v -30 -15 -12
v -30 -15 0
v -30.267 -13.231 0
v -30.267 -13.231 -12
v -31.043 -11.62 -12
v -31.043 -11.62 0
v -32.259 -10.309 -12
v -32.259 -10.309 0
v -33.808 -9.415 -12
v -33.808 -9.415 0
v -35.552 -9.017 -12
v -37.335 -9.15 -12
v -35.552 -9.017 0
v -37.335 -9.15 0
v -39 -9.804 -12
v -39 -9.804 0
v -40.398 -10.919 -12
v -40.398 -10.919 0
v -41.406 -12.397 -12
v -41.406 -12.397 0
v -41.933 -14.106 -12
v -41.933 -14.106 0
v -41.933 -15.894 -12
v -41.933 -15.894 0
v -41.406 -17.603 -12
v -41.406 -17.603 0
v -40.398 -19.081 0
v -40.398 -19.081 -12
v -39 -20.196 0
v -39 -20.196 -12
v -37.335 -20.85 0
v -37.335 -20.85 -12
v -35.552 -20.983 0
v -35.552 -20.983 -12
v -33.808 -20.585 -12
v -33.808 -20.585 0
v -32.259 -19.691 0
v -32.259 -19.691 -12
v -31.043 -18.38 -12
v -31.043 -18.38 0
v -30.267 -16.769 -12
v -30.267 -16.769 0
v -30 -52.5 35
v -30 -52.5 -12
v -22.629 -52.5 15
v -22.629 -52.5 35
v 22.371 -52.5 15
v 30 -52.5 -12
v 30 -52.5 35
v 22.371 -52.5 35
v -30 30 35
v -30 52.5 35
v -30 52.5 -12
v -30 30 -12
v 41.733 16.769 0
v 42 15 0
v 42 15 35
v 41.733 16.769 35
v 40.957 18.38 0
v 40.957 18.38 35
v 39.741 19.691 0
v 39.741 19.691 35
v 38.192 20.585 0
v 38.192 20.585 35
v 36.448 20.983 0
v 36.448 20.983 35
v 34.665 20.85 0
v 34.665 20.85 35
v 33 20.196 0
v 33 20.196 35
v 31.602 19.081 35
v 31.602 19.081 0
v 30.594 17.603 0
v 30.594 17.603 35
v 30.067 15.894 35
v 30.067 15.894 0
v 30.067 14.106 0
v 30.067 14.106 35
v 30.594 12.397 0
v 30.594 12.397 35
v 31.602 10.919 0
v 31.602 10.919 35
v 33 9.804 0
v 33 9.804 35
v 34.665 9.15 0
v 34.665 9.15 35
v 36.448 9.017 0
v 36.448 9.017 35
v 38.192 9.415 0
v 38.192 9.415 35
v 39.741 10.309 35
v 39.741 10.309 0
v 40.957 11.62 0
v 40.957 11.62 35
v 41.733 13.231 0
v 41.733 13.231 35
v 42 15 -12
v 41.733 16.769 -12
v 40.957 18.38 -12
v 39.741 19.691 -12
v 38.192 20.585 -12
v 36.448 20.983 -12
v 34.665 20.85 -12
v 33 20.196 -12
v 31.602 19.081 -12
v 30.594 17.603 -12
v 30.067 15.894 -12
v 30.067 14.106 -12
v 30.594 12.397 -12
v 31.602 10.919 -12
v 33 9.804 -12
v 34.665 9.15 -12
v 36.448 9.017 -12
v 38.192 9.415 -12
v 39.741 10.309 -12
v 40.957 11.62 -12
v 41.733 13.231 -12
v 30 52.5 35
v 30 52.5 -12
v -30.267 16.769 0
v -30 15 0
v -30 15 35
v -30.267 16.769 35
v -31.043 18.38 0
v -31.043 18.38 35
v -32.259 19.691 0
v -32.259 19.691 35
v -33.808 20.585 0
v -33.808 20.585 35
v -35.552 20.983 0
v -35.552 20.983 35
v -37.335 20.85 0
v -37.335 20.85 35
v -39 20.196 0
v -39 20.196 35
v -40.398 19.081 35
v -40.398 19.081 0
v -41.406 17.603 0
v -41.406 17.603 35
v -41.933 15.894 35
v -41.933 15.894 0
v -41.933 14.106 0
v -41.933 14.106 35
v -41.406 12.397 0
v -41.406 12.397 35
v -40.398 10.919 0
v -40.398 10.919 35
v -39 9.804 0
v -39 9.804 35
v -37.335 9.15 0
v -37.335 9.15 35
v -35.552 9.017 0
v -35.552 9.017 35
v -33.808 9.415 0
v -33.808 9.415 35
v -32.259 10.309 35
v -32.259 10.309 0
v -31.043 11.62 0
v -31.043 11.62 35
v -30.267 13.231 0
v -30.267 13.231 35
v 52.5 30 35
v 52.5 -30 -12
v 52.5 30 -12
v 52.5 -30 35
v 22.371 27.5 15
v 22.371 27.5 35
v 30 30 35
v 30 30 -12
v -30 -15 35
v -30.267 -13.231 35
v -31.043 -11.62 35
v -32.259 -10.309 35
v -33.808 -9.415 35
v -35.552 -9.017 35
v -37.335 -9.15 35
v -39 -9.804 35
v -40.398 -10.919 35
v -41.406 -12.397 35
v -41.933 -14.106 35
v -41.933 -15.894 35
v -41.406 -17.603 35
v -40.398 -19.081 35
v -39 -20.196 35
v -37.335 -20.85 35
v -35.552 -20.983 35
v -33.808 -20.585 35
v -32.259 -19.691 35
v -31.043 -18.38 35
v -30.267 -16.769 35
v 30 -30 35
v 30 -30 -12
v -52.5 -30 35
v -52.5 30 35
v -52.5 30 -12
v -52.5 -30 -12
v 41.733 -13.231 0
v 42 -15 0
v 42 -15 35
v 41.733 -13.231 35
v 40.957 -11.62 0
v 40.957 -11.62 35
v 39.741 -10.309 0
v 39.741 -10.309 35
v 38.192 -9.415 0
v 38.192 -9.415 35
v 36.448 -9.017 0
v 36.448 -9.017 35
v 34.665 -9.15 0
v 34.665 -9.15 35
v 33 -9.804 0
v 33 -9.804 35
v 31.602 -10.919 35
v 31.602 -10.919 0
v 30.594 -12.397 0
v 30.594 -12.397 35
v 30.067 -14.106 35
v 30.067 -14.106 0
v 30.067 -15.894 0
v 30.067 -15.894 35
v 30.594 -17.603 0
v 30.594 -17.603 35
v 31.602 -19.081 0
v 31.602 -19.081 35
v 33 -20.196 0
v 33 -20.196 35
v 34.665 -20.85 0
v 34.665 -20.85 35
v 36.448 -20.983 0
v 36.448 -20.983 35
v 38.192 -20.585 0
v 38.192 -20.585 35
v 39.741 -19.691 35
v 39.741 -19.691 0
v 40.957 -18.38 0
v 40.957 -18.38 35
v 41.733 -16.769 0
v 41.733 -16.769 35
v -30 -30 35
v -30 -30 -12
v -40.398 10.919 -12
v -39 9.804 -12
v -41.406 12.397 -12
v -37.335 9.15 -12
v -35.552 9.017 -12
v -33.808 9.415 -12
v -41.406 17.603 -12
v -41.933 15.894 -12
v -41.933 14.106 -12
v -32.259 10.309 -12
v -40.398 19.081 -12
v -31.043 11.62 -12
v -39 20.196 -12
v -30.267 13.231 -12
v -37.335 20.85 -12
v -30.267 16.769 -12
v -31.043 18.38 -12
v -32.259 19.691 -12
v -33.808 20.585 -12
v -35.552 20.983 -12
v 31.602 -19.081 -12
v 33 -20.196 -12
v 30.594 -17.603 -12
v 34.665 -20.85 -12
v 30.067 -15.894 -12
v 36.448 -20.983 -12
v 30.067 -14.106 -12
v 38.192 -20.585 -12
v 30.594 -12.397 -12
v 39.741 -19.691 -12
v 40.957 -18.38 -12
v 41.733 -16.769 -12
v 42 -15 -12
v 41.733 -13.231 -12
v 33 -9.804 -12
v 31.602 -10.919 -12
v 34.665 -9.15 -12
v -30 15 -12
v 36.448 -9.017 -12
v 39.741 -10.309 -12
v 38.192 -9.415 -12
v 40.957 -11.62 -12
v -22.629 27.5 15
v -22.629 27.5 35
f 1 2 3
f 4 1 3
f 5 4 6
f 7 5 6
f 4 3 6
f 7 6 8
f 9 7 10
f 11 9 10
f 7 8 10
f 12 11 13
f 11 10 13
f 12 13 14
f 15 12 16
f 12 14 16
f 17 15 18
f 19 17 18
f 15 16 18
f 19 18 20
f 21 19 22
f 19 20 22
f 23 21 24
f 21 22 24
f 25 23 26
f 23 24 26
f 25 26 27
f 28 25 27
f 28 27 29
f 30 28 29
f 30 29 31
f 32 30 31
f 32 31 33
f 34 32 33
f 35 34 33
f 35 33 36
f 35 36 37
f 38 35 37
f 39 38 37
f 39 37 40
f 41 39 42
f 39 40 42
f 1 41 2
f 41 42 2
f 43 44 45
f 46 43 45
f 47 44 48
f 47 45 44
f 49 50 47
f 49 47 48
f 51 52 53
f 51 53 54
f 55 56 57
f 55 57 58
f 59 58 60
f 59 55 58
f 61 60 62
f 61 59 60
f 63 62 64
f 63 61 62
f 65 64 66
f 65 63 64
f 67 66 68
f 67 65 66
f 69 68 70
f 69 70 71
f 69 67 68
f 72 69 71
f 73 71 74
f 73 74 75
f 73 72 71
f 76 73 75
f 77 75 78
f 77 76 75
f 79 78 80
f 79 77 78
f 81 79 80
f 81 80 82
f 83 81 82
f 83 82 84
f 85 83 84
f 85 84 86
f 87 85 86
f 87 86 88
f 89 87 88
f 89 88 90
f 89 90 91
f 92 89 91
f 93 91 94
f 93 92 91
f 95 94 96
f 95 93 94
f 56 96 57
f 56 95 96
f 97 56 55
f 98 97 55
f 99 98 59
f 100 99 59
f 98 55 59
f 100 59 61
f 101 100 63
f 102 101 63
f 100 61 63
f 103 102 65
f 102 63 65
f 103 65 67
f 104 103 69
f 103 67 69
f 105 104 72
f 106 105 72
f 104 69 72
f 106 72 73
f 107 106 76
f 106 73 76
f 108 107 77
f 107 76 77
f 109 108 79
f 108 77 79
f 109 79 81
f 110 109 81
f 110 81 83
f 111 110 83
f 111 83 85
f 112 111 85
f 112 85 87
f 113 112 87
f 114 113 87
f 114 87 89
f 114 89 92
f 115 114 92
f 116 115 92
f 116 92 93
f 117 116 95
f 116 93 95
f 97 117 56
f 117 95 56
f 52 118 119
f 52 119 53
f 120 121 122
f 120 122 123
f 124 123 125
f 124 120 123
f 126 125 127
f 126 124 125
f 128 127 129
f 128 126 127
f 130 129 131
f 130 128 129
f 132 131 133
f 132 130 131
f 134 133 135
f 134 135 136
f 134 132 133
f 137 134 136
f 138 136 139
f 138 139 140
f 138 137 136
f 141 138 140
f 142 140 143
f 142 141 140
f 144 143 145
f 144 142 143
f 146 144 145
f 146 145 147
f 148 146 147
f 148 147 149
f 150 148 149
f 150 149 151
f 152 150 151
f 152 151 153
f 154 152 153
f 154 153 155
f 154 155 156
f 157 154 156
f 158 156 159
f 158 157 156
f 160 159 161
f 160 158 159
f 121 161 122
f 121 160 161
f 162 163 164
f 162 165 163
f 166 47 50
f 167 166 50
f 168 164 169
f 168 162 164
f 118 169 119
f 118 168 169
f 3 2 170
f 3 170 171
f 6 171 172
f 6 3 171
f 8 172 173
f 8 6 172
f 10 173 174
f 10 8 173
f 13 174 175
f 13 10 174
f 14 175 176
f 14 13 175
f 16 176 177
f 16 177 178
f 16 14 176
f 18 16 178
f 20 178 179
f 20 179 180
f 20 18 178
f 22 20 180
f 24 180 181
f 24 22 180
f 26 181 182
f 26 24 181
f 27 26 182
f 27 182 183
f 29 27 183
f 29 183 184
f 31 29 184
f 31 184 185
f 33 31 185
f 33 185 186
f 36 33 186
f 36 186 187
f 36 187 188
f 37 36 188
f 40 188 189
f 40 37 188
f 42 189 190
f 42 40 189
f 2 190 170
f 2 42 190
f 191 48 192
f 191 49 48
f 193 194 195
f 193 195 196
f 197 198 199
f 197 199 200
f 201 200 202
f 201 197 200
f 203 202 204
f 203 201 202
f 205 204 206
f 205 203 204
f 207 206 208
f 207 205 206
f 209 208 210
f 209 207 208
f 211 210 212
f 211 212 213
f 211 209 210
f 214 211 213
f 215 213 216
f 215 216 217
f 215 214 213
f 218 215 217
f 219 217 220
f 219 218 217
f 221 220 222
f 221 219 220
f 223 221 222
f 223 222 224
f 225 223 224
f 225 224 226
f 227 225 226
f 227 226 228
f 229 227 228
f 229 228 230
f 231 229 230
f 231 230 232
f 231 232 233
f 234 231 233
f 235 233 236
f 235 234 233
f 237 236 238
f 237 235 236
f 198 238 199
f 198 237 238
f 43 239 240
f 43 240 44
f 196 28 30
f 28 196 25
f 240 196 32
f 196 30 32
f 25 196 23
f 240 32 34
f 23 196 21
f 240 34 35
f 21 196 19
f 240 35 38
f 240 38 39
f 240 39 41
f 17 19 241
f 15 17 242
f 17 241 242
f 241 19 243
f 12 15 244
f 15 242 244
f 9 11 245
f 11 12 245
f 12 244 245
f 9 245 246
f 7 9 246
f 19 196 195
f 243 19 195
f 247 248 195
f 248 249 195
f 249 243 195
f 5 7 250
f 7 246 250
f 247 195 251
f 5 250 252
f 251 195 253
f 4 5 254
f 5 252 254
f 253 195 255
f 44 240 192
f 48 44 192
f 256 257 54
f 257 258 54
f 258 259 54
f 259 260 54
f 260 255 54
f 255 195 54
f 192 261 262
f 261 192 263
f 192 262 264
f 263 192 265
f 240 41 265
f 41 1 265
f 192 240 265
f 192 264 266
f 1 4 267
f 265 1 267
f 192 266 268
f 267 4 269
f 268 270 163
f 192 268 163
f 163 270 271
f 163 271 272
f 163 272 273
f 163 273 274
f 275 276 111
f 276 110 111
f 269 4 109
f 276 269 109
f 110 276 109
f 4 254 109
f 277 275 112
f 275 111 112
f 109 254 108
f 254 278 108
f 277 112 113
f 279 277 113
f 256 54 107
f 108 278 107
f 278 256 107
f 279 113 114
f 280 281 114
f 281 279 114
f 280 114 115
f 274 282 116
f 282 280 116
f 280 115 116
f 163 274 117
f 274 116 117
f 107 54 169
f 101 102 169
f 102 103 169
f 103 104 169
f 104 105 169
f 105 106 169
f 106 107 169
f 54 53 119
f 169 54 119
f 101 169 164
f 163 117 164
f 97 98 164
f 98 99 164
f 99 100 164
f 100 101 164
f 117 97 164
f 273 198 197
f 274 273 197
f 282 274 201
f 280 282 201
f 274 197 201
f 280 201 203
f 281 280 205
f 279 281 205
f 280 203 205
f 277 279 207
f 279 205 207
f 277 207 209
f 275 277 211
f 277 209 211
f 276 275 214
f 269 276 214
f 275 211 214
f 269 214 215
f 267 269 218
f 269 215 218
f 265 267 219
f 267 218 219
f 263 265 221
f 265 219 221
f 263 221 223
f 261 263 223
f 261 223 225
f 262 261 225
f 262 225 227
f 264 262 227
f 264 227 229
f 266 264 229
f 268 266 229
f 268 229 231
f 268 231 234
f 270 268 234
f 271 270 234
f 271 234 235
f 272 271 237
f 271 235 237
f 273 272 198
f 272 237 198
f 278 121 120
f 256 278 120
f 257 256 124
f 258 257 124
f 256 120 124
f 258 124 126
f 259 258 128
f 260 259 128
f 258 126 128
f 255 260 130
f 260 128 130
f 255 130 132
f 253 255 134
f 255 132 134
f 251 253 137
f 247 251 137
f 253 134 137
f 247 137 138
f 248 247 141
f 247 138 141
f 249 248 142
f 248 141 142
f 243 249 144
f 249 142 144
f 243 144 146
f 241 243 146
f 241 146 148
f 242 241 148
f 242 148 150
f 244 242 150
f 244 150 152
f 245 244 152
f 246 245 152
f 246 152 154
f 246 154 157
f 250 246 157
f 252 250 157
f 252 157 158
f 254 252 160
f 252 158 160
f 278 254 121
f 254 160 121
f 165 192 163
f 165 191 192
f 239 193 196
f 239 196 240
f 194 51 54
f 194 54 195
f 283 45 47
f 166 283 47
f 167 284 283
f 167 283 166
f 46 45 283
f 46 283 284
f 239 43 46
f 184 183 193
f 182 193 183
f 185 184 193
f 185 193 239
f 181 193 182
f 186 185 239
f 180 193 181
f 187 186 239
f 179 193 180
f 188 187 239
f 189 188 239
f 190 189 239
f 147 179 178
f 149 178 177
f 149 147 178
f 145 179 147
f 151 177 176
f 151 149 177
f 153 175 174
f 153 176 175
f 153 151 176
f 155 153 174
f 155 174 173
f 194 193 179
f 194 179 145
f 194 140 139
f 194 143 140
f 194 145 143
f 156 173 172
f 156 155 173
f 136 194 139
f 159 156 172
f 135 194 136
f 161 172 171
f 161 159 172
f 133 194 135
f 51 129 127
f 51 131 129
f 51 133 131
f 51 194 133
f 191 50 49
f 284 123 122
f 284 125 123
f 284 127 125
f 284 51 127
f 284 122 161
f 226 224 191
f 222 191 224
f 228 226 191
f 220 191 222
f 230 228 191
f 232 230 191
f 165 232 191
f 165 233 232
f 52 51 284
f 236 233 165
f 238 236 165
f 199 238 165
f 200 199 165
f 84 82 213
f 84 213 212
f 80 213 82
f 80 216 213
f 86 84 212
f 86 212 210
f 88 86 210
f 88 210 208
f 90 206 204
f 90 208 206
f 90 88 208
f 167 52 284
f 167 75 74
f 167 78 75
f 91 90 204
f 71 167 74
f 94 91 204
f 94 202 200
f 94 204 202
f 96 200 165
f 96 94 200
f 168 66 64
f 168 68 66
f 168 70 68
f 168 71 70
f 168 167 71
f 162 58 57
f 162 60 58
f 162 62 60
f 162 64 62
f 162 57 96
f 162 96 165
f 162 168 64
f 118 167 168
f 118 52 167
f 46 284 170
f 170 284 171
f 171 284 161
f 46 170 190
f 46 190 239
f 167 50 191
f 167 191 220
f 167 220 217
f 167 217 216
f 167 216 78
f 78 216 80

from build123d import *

# Parameters (mm, degrees)
F0_R          = 6
F1_DEPTH      = 35
F1_DEPTH_BACK = 12
F2_W          = 45
F2_H          = 20
F3_DEPTH      = 80


with BuildPart() as f1:
    # F0 (on Top) → F1 (new body, two sides)
    with BuildSketch(Plane.XY) as f1_sk:
        Polygon((30, 30), (30, 52.5), (-30, 52.5), (-30, 30), (-52.5, 30), (-52.5, -30), (-30, -30), (-30, -52.5), (30, -52.5), (30, -30), (52.5, -30), (52.5, 30), align=None)
        with Locations((-36, -15)):
            Circle(F0_R, mode=Mode.SUBTRACT)
        with Locations((36, -15)):
            Circle(F0_R, mode=Mode.SUBTRACT)
        with Locations((-36, 15)):
            Circle(F0_R, mode=Mode.SUBTRACT)
        with Locations((36, 15)):
            Circle(F0_R, mode=Mode.SUBTRACT)
    extrude(amount=F1_DEPTH)
    extrude(f1_sk.sketch, amount=-F1_DEPTH_BACK)

    # F2 (on face) → F3 (cut)
    with BuildSketch(Plane.XZ.offset(52.5)):
        with Locations((-0.129311, 25)):
            Rectangle(F2_W, F2_H)
    extrude(amount=-F3_DEPTH, mode=Mode.SUBTRACT)


solid = f1.part
